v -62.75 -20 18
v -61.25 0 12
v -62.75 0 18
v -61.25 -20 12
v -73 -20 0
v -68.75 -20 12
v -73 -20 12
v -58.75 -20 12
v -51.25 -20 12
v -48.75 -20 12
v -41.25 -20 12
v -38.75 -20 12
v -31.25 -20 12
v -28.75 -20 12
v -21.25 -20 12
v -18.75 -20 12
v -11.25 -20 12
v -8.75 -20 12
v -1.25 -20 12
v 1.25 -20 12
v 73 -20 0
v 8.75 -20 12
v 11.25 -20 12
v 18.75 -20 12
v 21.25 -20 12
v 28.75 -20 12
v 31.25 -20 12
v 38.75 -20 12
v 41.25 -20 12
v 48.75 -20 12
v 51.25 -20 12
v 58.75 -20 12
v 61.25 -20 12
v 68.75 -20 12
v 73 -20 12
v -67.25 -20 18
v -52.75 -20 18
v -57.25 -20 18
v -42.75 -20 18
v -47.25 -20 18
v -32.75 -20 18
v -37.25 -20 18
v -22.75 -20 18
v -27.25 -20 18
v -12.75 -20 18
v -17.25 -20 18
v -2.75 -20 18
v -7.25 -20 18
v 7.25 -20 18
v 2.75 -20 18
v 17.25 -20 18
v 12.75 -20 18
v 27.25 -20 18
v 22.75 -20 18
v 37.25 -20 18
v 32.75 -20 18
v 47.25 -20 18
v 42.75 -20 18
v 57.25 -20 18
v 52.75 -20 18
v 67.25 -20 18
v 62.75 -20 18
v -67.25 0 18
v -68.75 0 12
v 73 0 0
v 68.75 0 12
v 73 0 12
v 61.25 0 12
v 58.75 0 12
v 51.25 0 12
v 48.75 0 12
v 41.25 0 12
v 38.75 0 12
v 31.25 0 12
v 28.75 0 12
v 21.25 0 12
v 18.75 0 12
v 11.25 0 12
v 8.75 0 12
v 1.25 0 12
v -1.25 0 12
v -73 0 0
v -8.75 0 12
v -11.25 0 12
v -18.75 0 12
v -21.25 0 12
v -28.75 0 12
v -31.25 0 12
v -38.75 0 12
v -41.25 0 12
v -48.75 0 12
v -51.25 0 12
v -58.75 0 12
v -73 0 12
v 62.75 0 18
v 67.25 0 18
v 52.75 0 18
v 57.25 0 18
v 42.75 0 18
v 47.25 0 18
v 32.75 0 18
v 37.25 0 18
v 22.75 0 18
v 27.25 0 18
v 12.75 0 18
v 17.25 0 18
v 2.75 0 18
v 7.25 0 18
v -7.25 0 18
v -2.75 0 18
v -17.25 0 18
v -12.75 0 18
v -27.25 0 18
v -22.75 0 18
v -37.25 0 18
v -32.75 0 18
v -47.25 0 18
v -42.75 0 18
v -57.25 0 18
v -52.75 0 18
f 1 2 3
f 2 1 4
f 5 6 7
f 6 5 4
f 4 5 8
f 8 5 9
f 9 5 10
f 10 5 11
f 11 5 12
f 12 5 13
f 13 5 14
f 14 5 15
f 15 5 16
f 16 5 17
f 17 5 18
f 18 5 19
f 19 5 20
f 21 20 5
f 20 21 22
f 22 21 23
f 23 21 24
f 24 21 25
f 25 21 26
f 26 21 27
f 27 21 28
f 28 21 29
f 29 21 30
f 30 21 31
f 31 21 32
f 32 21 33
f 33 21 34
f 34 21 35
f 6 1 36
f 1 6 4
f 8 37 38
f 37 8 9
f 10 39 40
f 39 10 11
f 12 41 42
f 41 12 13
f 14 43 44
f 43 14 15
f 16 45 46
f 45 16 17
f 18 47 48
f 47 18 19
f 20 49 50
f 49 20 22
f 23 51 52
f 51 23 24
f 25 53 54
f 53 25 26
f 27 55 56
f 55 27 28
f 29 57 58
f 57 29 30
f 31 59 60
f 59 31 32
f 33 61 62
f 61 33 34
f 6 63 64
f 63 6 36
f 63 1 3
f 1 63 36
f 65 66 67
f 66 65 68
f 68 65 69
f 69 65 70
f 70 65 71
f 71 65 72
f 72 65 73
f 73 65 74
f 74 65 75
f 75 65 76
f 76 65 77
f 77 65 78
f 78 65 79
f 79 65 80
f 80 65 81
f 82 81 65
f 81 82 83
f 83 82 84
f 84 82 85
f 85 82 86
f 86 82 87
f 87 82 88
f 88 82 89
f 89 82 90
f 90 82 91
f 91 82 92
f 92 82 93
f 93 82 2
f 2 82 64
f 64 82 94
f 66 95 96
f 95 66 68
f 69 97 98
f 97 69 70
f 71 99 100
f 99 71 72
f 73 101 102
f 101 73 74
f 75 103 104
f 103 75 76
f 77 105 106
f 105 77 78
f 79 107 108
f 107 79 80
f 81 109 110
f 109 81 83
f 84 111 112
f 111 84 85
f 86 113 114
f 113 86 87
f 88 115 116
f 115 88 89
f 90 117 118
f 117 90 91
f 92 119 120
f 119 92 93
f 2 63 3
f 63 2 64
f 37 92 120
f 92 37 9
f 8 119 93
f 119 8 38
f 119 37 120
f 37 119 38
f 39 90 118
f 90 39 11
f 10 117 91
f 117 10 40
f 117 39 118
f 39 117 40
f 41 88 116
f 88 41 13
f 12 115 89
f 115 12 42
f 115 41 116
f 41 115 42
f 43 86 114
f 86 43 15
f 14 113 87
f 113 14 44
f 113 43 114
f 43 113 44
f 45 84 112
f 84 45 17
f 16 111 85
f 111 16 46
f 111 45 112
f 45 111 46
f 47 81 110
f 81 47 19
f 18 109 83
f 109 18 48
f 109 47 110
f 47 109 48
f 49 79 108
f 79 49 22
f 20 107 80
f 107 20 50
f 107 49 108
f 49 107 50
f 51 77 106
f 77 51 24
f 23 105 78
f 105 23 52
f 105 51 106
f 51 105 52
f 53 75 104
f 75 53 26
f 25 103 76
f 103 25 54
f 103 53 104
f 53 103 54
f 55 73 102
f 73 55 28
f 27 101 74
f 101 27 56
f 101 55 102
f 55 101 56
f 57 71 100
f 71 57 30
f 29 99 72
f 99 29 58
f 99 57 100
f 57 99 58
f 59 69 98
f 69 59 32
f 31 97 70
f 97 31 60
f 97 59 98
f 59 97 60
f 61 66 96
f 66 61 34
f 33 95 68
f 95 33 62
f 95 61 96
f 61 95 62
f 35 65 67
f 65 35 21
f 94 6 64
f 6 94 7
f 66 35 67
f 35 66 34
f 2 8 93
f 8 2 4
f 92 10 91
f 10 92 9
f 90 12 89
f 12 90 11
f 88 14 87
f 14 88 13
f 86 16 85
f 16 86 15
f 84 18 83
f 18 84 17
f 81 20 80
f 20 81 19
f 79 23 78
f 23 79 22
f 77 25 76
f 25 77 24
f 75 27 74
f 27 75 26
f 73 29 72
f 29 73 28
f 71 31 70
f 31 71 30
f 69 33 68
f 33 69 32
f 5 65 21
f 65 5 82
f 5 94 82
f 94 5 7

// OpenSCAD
$fn = 32;

// ----------------------------------------------------------------------
// Toothed rack, 14 teeth
// 10 mm pitch, 6 mm teeth
// ----------------------------------------------------------------------

// --- parameters (mm) ---
bar_w = 20;     // bar width (Y)
bar_h = 12;     // bar height (Z)
teeth = 14;     // number of teeth
pitch = 10;     // tooth pitch
tooth_h = 6;    // tooth height above the bar
root_w = 8;     // tooth width at the root
crest_w = 4.5;  // tooth width at the crest

// --- derived feature positions (mm) ---
span = (teeth - 1) * pitch;  // = 130   distance between the outer teeth
bar_l = span + root_w + 8;   // = 146   bar length: teeth plus 4 mm at each end
tooth_x = -span / 2;         // = -65   X of the first tooth
height = bar_h + tooth_h;    // = 18   overall height
feature_centers = [
  [tooth_x + 0 * pitch, -bar_w / 2],
  [tooth_x + 1 * pitch, -bar_w / 2],
  [tooth_x + 2 * pitch, -bar_w / 2],
  [tooth_x + 3 * pitch, -bar_w / 2],
  [tooth_x + 4 * pitch, -bar_w / 2],
  [tooth_x + 5 * pitch, -bar_w / 2],
  [tooth_x + 6 * pitch, -bar_w / 2],
  [tooth_x + 7 * pitch, -bar_w / 2],
  [tooth_x + 8 * pitch, -bar_w / 2],
  [tooth_x + 9 * pitch, -bar_w / 2],
  [tooth_x + 10 * pitch, -bar_w / 2],
  [tooth_x + 11 * pitch, -bar_w / 2],
  [tooth_x + 12 * pitch, -bar_w / 2],
  [tooth_x + 13 * pitch, -bar_w / 2]
];   // tooth centre line, drives the tooth loop

// bar with a rack of teeth, one extruded trapezoium per centre
module rack_tooth() {
  linear_extrude(height = bar_w)
    polygon(points = [
      [0, 0],
      [root_w, 0],
      [root_w / 2 + crest_w / 2, tooth_h + 1],
      [root_w / 2 - crest_w / 2, tooth_h + 1]
    ]);
}

union() {
  translate([-bar_l / 2, -bar_w, 0]) cube([bar_l, bar_w, bar_h]);
  for (centre = feature_centers)
    translate([centre[0] - root_w / 2, 0, bar_h - 1]) rotate([90, 0, 0]) rack_tooth();
}
